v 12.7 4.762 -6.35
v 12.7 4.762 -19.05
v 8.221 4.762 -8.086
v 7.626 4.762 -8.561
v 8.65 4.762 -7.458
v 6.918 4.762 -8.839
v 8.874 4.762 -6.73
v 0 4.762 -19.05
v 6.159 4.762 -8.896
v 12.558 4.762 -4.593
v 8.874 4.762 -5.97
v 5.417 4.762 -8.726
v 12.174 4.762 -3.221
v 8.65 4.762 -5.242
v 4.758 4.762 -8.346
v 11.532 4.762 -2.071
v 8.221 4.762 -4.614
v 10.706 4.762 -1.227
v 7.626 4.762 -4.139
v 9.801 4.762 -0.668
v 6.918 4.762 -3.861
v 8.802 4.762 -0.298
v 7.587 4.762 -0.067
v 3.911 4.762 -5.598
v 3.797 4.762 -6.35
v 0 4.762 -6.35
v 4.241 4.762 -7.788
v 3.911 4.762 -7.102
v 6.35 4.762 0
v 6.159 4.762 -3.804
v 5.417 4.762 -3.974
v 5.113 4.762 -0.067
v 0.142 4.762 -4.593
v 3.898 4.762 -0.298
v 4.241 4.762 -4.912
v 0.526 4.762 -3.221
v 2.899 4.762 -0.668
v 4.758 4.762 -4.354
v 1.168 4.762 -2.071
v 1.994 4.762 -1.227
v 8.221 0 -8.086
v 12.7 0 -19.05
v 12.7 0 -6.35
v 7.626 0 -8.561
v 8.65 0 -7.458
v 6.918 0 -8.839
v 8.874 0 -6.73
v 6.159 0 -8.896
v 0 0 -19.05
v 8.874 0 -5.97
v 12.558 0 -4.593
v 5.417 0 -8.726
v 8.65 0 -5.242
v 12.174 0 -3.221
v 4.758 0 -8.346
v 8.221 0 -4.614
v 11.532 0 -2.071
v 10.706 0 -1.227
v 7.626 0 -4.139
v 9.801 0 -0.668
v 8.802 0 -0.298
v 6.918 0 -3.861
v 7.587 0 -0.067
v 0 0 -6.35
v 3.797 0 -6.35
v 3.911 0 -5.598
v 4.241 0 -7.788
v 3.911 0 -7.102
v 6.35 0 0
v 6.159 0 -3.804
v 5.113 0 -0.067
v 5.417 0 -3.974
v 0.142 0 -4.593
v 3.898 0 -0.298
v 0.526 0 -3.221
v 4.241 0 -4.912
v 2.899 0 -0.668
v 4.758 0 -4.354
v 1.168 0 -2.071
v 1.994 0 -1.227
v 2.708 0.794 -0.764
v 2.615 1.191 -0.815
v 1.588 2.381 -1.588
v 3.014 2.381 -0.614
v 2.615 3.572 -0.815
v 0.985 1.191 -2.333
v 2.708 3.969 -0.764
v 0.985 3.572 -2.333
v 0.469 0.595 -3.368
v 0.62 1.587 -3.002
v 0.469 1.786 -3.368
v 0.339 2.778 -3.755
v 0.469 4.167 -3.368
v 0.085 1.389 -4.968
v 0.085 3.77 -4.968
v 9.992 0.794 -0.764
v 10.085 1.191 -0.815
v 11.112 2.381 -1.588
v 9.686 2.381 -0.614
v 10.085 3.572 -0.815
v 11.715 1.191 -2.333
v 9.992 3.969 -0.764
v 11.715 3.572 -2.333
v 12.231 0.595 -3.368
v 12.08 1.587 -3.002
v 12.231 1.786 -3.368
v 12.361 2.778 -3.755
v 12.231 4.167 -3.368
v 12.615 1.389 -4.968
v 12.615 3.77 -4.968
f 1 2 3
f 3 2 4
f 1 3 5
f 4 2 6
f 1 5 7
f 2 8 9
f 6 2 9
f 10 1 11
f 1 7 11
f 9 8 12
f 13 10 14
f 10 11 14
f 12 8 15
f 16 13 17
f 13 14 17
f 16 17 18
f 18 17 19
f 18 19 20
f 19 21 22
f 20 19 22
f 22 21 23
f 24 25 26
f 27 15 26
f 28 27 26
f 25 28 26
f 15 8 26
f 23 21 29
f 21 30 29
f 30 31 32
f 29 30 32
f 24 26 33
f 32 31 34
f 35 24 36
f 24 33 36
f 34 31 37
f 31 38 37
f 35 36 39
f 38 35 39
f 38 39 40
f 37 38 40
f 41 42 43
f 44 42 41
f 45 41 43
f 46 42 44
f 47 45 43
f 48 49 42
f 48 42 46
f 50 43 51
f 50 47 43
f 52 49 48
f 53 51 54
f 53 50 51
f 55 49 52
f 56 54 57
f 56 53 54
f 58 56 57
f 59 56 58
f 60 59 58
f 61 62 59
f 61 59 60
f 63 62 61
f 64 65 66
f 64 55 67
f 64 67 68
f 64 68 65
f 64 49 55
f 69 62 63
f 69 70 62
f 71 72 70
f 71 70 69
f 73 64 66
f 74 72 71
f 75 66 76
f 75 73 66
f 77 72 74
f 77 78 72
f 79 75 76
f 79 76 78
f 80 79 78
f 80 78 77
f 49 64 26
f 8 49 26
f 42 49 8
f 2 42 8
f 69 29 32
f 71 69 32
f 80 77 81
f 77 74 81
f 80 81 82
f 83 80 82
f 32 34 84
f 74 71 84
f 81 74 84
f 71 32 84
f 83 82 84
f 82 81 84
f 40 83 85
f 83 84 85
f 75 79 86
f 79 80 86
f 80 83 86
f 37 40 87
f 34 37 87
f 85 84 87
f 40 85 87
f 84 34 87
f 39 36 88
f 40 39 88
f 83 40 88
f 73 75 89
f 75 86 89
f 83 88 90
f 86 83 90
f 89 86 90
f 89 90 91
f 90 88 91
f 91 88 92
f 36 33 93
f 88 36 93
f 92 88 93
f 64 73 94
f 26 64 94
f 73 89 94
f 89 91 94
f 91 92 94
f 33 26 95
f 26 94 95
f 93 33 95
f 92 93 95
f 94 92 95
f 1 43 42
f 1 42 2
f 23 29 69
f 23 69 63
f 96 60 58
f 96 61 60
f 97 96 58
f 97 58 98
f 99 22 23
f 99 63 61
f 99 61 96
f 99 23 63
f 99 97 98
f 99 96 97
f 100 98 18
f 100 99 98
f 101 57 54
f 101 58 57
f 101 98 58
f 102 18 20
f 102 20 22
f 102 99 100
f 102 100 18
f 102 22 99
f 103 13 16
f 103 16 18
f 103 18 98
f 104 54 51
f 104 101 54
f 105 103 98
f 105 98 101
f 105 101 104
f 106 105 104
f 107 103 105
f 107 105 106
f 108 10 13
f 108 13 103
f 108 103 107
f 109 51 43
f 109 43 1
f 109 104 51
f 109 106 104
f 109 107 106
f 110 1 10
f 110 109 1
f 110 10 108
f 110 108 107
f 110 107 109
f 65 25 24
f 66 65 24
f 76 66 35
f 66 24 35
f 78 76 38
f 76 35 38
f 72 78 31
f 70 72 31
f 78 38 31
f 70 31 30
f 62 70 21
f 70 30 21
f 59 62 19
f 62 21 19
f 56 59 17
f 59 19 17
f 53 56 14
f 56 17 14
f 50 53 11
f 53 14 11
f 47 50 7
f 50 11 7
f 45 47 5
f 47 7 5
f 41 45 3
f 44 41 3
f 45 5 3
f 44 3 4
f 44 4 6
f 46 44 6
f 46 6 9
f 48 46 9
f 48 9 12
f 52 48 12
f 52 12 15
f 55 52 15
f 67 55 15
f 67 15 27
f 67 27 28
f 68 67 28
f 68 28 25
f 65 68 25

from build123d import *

# Parameters (mm, degrees)
F0_W        = 4.7625
F0_H        = 19.05
F1_DEPTH    = 12.7
F3_T1_DEPTH = 36.5125
F4_D        = 5.1054


# Not quite as in the source:
# - a fillet or chamfer that OpenCascade refuses, or shapes differently, is made with other operations: its cross-section is extruded or revolved along the edge and cut away or added


with BuildPart() as f1:
    # F0 (on Right) → F1 (new body)
    with BuildSketch(Plane.YZ):
        with Locations((2.38125, -9.525)):
            Rectangle(F0_W, F0_H)
    extrude(amount=F1_DEPTH)

    # F3: fillet of radius 6.35 on 2 edges, made by hand

    # F3_s2 → F3_t1 (cut)
    with BuildSketch(Plane.XZ.offset(-20.6375)):
        with BuildLine():
            add(Edge.make_bspline(
                [(6.35, 0), (0, 0), (0, -6.35)],
                knots=[0, 0, 0, 1, 1, 1], degree=2, weights=[1, 1, 1]))
            Line((0, -6.35), (0, 0))
            Line((0, 0), (6.35, 0))
        make_face()
        with BuildLine():
            add(Edge.make_bspline(
                [(6.35, 0), (12.7, 0), (12.7, -6.35)],
                knots=[0, 0, 0, 1, 1, 1], degree=2, weights=[1, 1, 1]))
            Line((12.7, -6.35), (12.7, 0))
            Line((12.7, 0), (6.35, 0))
        make_face()
    extrude(amount=F3_T1_DEPTH, mode=Mode.SUBTRACT)

    # F4 (through all)
    with Locations(Plane.XZ):
        with Locations((6.35, -6.35)):
            Hole(F4_D / 2)


solid = f1.part
